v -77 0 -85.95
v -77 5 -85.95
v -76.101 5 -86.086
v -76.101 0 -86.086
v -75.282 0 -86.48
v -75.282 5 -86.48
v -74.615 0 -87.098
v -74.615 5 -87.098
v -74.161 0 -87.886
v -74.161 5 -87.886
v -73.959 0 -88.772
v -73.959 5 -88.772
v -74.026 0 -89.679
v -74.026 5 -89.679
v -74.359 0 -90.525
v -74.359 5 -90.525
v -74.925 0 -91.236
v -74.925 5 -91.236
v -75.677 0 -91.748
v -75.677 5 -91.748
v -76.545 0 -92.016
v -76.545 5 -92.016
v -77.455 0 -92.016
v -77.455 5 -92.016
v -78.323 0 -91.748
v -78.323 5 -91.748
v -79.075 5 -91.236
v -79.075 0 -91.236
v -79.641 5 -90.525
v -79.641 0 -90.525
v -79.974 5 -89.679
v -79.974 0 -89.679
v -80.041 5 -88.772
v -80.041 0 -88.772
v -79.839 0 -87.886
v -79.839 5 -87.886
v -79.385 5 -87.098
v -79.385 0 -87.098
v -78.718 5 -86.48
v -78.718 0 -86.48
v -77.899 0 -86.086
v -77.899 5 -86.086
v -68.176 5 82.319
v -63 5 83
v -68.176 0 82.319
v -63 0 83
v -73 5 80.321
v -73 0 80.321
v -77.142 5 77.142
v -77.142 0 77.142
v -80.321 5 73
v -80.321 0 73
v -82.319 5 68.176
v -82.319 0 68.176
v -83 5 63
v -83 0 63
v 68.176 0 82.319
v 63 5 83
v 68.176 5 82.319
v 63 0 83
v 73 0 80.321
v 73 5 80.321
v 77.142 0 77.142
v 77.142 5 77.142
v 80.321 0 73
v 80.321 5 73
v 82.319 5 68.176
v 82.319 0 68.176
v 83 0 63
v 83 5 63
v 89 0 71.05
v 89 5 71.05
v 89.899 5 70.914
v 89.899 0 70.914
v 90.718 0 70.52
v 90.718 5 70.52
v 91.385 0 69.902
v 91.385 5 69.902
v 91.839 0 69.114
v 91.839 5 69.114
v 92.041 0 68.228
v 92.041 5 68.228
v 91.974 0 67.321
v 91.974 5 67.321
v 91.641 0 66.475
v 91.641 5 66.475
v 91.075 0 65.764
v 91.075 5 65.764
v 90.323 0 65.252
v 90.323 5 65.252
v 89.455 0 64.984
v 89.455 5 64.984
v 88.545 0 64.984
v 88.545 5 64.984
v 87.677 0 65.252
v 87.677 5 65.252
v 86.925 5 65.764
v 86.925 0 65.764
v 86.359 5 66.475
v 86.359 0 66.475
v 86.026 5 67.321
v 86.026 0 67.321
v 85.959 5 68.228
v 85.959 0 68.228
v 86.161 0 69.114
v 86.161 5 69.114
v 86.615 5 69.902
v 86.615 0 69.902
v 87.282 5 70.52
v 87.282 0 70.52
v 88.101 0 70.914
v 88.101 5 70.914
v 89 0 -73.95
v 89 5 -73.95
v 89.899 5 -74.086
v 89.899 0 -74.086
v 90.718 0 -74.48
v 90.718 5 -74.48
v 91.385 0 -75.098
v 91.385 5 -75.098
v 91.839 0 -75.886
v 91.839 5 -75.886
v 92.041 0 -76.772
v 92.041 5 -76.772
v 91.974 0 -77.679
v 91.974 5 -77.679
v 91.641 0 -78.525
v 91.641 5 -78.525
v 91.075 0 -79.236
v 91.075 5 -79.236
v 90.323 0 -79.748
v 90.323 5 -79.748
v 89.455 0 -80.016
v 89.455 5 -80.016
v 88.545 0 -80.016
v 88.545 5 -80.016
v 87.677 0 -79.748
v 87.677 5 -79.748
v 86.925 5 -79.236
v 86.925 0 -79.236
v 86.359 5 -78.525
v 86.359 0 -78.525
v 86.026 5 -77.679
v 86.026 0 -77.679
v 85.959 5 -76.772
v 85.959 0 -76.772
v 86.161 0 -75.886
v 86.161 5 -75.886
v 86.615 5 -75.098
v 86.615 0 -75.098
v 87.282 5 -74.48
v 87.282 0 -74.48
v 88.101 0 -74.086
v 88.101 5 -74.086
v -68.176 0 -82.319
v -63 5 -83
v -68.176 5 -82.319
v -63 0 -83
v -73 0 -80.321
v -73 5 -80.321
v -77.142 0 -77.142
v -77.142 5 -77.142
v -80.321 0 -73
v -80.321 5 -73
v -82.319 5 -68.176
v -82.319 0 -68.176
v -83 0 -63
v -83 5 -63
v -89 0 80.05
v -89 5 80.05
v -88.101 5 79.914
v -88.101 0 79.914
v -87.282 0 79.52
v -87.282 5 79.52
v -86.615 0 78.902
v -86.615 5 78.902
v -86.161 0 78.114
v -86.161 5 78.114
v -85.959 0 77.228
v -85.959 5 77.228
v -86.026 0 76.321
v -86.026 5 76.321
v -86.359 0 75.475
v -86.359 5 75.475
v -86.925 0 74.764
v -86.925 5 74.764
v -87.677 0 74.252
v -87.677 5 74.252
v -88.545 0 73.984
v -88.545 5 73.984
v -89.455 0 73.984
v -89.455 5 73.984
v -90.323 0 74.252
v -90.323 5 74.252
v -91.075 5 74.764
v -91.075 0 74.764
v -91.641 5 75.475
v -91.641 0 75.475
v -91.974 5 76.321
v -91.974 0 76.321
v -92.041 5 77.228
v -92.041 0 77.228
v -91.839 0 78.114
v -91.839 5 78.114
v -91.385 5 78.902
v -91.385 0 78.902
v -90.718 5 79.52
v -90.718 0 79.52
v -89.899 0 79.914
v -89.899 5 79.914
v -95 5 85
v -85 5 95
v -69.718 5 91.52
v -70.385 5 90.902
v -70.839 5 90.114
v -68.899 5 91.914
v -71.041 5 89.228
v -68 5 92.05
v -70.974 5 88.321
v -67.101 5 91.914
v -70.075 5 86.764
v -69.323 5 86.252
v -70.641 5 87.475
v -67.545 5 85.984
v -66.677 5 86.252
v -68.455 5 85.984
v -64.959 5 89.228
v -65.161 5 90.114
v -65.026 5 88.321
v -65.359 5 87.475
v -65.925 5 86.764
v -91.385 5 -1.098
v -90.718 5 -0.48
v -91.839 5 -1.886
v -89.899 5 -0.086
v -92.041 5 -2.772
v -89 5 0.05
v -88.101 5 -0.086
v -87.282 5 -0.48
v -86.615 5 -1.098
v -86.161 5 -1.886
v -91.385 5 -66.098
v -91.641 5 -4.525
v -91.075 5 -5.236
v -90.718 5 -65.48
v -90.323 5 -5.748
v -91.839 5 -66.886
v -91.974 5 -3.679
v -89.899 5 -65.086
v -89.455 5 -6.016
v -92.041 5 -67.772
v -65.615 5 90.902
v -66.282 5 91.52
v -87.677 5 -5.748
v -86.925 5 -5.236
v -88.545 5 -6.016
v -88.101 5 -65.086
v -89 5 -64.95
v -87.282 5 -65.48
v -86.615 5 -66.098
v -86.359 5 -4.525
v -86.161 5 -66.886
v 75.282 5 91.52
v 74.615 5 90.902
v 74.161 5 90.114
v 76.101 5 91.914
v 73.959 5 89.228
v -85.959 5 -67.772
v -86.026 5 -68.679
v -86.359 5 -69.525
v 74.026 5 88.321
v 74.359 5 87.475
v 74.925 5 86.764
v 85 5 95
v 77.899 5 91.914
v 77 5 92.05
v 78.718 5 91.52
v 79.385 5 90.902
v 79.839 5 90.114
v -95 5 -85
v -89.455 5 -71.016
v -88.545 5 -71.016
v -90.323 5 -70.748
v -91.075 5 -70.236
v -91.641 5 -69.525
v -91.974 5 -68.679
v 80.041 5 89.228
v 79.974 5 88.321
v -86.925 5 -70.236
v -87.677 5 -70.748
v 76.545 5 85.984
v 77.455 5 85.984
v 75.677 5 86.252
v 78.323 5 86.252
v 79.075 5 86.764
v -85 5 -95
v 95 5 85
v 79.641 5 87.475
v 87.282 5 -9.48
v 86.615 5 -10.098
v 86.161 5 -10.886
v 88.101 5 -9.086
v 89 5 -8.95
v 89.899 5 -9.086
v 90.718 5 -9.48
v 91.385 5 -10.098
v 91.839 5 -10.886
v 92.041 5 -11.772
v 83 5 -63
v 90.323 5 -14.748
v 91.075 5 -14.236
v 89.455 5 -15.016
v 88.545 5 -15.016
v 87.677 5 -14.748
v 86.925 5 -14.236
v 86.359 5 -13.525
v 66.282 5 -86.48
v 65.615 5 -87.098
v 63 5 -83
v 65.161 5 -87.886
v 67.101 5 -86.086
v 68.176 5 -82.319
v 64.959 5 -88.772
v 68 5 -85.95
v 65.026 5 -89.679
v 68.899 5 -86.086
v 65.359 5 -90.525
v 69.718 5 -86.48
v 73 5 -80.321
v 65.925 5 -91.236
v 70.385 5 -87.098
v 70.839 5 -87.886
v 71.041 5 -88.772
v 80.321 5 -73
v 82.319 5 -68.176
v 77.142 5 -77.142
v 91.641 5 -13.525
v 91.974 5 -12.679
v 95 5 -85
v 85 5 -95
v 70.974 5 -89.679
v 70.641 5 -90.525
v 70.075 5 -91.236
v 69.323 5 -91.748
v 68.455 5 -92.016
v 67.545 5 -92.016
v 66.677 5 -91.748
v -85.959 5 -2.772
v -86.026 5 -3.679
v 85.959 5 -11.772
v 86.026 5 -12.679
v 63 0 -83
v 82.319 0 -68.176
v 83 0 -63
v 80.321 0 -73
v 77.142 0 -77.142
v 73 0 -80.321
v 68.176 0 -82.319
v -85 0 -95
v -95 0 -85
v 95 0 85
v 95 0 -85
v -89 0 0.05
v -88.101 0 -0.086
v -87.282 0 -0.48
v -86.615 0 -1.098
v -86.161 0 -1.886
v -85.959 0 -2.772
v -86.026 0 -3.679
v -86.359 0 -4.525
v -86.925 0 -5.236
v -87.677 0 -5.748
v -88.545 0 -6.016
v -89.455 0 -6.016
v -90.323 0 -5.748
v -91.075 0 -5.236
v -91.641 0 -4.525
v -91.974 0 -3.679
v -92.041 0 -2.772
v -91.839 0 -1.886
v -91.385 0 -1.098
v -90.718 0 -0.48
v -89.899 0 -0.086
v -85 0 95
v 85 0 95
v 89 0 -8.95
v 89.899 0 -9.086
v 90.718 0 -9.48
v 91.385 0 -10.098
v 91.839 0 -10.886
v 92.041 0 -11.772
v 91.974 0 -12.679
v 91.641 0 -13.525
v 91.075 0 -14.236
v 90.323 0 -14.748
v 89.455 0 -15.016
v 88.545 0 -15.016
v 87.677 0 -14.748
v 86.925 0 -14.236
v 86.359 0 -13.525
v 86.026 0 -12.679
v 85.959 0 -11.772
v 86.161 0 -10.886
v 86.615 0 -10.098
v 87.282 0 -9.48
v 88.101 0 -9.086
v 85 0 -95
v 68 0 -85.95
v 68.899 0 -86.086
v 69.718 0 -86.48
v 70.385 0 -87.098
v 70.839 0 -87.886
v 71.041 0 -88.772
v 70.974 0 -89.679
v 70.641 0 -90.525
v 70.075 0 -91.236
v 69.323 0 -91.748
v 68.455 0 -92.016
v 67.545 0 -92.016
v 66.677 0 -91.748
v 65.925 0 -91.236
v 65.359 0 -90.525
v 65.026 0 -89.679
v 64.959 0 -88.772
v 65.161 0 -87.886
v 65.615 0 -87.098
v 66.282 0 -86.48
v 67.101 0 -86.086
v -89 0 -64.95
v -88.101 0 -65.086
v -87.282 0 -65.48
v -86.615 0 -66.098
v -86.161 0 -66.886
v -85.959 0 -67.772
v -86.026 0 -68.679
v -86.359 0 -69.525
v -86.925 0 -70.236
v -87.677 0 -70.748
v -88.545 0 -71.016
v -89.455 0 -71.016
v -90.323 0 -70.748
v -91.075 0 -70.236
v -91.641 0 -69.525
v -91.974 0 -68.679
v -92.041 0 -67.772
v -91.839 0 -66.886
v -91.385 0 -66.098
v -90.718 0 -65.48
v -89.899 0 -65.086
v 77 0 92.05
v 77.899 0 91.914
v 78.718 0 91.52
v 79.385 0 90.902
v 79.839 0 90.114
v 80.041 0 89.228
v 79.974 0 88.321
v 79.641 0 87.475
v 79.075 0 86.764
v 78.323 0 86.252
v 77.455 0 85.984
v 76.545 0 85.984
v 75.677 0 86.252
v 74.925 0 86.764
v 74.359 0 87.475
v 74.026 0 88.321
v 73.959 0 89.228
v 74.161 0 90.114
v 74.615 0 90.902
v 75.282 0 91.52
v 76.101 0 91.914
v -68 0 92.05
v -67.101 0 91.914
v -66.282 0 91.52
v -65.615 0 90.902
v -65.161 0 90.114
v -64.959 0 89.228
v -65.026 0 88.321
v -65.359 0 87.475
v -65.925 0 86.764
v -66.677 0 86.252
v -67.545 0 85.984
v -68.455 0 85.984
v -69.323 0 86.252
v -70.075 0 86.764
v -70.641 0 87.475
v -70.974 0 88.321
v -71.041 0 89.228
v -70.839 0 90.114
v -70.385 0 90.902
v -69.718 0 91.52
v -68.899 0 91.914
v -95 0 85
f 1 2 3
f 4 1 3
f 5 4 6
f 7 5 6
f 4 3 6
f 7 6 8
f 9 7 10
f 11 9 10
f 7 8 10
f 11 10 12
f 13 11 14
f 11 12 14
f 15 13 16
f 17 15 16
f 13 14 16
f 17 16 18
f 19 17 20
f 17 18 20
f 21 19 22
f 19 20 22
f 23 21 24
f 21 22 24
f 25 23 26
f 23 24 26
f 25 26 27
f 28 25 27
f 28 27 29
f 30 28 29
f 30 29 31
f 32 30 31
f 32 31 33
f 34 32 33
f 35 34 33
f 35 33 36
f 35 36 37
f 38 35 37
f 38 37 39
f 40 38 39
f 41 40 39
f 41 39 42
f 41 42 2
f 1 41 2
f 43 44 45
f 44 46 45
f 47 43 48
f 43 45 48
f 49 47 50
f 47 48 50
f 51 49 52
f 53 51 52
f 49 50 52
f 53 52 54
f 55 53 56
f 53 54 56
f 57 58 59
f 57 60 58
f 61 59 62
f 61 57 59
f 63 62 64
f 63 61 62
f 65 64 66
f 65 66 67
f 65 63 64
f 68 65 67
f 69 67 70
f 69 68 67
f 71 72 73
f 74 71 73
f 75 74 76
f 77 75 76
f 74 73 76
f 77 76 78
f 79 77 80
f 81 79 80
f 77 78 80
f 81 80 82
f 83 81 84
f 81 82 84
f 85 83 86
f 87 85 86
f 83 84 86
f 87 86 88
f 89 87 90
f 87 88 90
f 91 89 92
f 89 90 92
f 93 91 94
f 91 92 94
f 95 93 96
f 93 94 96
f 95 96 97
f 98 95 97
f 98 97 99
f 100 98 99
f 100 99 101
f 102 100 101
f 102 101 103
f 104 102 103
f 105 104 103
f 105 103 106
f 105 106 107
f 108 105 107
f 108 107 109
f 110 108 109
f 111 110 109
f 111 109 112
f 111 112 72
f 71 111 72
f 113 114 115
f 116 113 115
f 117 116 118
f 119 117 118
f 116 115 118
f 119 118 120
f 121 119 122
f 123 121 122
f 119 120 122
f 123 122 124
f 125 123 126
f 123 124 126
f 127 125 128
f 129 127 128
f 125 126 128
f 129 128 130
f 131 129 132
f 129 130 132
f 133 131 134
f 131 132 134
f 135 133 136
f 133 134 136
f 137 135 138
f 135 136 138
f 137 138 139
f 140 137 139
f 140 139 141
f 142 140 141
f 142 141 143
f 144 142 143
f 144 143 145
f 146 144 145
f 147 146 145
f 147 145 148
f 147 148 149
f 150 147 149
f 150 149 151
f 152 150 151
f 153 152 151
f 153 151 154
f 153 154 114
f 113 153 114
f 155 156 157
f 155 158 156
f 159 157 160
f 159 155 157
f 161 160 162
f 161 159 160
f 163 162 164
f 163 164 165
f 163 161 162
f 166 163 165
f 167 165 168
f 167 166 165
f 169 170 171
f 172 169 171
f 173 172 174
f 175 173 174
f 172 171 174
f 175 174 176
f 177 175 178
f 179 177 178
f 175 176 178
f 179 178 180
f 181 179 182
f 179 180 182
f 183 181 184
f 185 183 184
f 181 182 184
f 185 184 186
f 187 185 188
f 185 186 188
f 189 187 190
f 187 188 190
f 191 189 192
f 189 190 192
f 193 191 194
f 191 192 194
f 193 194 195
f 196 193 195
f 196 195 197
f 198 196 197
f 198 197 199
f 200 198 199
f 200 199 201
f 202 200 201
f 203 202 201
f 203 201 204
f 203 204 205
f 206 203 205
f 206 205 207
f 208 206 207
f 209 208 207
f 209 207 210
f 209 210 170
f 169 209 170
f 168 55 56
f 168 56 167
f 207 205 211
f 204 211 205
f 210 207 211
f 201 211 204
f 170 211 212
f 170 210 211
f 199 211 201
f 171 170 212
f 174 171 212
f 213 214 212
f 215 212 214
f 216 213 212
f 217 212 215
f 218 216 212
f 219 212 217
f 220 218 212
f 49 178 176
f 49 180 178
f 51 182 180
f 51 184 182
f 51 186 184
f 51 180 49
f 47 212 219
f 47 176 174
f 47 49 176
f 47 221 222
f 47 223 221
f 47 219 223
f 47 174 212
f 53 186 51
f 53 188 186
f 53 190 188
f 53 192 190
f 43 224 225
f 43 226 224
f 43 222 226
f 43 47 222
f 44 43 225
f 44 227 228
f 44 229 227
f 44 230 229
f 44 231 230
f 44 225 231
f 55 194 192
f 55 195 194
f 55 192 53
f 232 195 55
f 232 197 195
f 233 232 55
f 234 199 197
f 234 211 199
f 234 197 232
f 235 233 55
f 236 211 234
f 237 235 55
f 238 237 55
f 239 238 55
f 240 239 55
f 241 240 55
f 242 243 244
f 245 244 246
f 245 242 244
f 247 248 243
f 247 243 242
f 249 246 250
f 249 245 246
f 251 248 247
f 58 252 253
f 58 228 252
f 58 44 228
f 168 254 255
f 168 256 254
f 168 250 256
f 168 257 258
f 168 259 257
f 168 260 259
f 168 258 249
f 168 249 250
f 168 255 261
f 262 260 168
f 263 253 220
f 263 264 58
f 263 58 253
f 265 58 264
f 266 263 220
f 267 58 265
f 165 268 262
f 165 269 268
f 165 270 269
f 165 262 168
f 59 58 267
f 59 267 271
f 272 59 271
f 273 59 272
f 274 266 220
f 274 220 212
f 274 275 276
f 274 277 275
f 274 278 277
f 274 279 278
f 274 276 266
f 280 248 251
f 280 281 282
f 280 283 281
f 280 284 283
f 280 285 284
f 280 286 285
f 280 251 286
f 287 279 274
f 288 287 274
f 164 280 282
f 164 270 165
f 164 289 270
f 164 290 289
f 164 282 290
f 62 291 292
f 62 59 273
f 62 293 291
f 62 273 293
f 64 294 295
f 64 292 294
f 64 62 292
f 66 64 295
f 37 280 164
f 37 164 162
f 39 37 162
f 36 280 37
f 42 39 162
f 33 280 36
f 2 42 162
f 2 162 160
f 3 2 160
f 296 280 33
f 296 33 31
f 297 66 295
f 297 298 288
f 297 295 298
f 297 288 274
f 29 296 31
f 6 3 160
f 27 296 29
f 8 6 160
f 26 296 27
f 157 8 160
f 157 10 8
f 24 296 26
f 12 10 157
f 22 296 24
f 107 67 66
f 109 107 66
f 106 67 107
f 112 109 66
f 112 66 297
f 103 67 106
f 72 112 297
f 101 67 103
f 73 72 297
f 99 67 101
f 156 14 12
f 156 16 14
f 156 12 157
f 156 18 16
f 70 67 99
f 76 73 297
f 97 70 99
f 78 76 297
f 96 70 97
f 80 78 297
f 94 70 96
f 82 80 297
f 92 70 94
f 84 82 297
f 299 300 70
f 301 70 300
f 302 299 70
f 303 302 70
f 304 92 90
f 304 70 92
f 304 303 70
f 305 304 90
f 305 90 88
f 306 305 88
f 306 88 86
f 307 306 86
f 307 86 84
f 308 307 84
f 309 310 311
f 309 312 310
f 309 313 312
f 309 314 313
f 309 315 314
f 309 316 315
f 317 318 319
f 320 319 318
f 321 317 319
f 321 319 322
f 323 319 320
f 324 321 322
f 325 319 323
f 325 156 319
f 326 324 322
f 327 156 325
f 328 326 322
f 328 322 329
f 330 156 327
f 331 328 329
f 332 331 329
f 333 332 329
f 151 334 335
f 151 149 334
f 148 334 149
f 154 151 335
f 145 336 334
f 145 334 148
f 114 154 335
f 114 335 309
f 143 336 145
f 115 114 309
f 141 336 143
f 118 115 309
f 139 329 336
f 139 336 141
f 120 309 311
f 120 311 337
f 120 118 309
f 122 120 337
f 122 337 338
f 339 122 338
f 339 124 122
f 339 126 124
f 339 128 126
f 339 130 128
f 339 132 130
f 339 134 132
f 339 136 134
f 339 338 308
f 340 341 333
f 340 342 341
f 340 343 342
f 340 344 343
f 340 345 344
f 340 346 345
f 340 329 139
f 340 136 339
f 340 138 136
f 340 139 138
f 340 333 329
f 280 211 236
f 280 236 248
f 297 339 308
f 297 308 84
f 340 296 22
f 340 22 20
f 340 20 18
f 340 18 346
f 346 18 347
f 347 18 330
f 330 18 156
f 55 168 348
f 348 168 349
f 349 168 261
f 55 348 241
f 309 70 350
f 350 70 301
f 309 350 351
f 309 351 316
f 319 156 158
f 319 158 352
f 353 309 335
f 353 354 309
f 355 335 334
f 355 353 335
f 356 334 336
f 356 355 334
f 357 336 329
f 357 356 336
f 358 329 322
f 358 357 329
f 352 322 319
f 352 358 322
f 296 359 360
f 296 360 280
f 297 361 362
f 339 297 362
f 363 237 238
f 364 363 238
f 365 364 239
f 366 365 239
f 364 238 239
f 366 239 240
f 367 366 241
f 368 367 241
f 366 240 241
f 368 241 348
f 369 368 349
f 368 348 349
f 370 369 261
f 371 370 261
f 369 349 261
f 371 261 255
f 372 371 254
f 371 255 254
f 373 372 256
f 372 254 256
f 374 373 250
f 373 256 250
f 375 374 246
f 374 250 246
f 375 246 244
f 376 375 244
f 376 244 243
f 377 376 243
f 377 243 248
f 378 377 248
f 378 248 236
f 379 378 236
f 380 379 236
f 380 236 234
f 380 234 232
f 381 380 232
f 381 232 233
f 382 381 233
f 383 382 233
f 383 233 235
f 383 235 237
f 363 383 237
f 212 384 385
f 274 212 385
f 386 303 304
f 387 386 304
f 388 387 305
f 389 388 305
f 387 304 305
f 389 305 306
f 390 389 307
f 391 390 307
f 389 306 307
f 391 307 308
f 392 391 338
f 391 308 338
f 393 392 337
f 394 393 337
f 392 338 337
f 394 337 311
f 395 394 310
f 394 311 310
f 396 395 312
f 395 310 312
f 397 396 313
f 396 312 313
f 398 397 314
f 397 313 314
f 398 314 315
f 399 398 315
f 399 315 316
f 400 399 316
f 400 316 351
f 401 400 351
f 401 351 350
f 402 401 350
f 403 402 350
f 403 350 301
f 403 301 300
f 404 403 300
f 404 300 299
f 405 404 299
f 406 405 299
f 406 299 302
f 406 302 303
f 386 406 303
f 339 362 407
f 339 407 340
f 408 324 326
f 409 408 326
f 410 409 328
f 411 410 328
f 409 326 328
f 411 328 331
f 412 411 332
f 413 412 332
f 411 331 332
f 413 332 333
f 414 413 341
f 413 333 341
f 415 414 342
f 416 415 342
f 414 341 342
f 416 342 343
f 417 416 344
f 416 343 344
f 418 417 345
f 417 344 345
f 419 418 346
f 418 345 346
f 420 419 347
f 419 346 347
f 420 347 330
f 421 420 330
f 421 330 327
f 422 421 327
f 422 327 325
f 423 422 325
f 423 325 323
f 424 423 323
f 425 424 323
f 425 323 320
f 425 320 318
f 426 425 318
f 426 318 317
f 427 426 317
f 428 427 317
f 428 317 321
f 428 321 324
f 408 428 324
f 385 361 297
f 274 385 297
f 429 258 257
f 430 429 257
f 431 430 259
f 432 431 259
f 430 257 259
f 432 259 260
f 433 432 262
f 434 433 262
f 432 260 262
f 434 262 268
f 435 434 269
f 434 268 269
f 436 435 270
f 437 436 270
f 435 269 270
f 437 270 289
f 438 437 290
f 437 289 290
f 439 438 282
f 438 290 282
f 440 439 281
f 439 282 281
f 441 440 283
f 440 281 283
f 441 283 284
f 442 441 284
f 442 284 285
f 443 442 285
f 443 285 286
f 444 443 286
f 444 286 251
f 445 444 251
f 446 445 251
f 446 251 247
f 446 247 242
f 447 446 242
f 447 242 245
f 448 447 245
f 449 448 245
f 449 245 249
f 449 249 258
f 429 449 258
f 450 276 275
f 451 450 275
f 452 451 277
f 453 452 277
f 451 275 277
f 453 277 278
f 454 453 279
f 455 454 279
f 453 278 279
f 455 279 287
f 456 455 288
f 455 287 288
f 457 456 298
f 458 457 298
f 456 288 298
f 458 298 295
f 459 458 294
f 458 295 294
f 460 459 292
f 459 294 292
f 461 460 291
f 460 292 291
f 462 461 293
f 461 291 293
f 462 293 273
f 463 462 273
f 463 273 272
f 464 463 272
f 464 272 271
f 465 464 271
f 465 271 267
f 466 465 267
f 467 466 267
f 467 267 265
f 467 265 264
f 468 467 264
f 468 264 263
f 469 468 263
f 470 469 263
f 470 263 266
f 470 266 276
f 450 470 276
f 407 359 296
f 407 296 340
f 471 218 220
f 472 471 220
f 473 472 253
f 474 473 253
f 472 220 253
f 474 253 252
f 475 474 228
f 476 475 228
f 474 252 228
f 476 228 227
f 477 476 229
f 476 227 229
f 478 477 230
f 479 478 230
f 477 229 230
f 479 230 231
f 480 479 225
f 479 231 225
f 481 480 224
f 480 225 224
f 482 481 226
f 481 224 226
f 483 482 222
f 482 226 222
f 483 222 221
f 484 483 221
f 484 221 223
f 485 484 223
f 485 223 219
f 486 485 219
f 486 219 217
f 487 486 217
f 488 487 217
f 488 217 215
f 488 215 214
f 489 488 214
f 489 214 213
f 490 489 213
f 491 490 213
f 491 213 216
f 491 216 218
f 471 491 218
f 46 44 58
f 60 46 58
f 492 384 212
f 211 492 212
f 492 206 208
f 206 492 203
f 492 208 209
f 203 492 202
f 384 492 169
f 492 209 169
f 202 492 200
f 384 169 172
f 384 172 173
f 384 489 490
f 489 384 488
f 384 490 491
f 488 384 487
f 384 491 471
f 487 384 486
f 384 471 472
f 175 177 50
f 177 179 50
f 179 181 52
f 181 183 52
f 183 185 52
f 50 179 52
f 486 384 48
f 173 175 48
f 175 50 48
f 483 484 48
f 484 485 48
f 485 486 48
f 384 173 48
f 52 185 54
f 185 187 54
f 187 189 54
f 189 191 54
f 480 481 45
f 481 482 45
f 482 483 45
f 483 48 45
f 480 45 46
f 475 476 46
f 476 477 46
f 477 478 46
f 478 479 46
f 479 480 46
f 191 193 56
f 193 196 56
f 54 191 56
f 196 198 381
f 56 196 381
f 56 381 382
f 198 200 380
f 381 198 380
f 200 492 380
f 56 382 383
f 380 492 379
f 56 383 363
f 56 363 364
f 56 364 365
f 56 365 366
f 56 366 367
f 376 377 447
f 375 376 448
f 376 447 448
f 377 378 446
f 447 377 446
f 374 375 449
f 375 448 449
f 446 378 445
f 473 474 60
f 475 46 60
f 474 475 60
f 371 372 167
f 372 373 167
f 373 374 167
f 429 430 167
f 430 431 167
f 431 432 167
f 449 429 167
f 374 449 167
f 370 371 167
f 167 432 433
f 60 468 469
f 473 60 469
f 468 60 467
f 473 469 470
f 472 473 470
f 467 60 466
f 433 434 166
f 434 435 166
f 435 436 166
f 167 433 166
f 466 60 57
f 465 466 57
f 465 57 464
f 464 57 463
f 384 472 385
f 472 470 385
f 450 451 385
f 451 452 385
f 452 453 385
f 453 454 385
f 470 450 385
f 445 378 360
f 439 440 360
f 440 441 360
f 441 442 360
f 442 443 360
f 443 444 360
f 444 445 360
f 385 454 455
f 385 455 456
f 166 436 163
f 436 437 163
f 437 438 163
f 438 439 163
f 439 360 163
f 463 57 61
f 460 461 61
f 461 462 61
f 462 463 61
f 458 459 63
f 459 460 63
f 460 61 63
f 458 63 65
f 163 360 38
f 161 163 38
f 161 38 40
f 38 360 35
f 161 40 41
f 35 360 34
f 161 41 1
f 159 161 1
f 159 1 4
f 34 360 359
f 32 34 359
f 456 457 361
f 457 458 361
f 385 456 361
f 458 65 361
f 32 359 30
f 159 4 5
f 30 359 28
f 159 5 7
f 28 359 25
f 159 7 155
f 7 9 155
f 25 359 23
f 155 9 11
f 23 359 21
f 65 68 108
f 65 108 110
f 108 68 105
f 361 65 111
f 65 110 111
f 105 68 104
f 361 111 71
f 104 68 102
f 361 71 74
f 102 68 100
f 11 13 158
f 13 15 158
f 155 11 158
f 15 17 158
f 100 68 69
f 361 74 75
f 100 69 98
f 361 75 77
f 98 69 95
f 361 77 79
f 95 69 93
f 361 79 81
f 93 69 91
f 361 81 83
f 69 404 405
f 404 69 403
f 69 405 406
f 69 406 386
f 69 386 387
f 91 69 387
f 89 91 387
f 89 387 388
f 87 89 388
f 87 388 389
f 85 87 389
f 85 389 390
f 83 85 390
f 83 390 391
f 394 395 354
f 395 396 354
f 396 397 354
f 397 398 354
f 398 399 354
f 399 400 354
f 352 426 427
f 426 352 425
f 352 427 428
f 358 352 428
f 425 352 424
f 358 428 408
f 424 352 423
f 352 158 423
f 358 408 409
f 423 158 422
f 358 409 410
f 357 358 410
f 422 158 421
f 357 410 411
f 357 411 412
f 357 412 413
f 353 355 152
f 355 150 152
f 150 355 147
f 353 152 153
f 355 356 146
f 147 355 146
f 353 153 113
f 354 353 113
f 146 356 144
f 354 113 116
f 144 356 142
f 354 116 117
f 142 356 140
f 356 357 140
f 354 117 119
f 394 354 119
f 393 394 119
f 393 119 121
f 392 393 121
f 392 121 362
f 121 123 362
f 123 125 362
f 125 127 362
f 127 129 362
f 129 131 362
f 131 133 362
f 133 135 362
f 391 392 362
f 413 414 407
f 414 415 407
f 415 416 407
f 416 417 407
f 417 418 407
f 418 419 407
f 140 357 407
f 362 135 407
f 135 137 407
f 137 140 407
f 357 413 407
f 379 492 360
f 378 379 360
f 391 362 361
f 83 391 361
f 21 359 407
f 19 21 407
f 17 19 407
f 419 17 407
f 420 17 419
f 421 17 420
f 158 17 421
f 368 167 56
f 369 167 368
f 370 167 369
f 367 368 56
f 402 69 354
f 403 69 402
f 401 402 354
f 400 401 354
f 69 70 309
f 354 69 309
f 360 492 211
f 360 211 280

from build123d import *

# Parameters (mm, degrees)
SKETCH1_W           = 190
SKETCH1_H           = 190
BOSS_EXTRUDE1_DEPTH = 5
SKETCH2_W           = 166
SKETCH2_H           = 166
CUT_EXTRUDE1_DEPTH  = 135.443296597
FILLET1_R           = 20
SKETCH3_R           = 3.05
CUT_EXTRUDE2_DEPTH  = 135.443296597
SKETCH4_R           = 3.05
CUT_EXTRUDE3_DEPTH  = 10
CHAMFER1_SIZE       = 10


with BuildPart() as part:
    # Sketch1 → Boss-Extrude1 (new body)
    with BuildSketch(Plane(origin=(0, 0, 0), x_dir=(1, 0, 0), z_dir=(0, 1, 0))):
        Rectangle(SKETCH1_W, SKETCH1_H)
    extrude(amount=BOSS_EXTRUDE1_DEPTH)

    # Sketch2 → Cut-Extrude1 (cut, through all)
    with BuildSketch(Plane(origin=(0, 5, 0), x_dir=(1, 0, 0), z_dir=(0, 1, 0))):
        Rectangle(SKETCH2_W, SKETCH2_H)
    extrude(amount=-CUT_EXTRUDE1_DEPTH, mode=Mode.SUBTRACT)

    # Fillet1
    fillet1_edges = [part.edges().sort_by_distance(p)[0] for p in [
        (83, 2.5, -83),
        (83, 2.5, 83),
        (-83, 2.5, 83),
        (-83, 2.5, -83),
    ]]
    fillet(fillet1_edges, radius=FILLET1_R)

    # Sketch3 → Cut-Extrude2 (cut, through all)
    with BuildSketch(Plane(origin=(0, 5, 0), x_dir=(1, 0, 0), z_dir=(0, 1, 0))):
        with Locations(Location((-77, 89, 0), (0, 0, 270))):
            Circle(SKETCH3_R)
        with Locations(Location((-89, 68, 0), (0, 0, 270))):
            Circle(SKETCH3_R)
        with Locations(Location((89, 77, 0), (0, 0, 270))):
            Circle(SKETCH3_R)
        with Locations(Location((68, 89, 0), (0, 0, 270))):
            Circle(SKETCH3_R)
        with Locations(Location((77, -89, 0), (0, 0, 270))):
            Circle(SKETCH3_R)
        with Locations(Location((89, -68, 0), (0, 0, 270))):
            Circle(SKETCH3_R)
        with Locations(Location((-89, -77, 0), (0, 0, 270))):
            Circle(SKETCH3_R)
        with Locations(Location((-68, -89, 0), (0, 0, 270))):
            Circle(SKETCH3_R)
    extrude(amount=-CUT_EXTRUDE2_DEPTH, mode=Mode.SUBTRACT)

    # Sketch4 → Cut-Extrude3 (cut)
    with BuildSketch(Plane(origin=(0, 5, 0), x_dir=(1, 0, 0), z_dir=(0, 1, 0))):
        with Locations(Location((-89, 3, 0), (0, 0, 270))):
            Circle(SKETCH4_R)
        with Locations(Location((89, 12, 0), (0, 0, 270))):
            Circle(SKETCH4_R)
    extrude(amount=-CUT_EXTRUDE3_DEPTH, mode=Mode.SUBTRACT)

    # Chamfer1
    chamfer1_edges = [part.edges().sort_by_distance(p)[0] for p in [
        (-95, 2.5, -95),
        (-95, 2.5, 95),
        (95, 2.5, 95),
        (95, 2.5, -95),
    ]]
    chamfer(chamfer1_edges, length=CHAMFER1_SIZE)


solid = part.part
